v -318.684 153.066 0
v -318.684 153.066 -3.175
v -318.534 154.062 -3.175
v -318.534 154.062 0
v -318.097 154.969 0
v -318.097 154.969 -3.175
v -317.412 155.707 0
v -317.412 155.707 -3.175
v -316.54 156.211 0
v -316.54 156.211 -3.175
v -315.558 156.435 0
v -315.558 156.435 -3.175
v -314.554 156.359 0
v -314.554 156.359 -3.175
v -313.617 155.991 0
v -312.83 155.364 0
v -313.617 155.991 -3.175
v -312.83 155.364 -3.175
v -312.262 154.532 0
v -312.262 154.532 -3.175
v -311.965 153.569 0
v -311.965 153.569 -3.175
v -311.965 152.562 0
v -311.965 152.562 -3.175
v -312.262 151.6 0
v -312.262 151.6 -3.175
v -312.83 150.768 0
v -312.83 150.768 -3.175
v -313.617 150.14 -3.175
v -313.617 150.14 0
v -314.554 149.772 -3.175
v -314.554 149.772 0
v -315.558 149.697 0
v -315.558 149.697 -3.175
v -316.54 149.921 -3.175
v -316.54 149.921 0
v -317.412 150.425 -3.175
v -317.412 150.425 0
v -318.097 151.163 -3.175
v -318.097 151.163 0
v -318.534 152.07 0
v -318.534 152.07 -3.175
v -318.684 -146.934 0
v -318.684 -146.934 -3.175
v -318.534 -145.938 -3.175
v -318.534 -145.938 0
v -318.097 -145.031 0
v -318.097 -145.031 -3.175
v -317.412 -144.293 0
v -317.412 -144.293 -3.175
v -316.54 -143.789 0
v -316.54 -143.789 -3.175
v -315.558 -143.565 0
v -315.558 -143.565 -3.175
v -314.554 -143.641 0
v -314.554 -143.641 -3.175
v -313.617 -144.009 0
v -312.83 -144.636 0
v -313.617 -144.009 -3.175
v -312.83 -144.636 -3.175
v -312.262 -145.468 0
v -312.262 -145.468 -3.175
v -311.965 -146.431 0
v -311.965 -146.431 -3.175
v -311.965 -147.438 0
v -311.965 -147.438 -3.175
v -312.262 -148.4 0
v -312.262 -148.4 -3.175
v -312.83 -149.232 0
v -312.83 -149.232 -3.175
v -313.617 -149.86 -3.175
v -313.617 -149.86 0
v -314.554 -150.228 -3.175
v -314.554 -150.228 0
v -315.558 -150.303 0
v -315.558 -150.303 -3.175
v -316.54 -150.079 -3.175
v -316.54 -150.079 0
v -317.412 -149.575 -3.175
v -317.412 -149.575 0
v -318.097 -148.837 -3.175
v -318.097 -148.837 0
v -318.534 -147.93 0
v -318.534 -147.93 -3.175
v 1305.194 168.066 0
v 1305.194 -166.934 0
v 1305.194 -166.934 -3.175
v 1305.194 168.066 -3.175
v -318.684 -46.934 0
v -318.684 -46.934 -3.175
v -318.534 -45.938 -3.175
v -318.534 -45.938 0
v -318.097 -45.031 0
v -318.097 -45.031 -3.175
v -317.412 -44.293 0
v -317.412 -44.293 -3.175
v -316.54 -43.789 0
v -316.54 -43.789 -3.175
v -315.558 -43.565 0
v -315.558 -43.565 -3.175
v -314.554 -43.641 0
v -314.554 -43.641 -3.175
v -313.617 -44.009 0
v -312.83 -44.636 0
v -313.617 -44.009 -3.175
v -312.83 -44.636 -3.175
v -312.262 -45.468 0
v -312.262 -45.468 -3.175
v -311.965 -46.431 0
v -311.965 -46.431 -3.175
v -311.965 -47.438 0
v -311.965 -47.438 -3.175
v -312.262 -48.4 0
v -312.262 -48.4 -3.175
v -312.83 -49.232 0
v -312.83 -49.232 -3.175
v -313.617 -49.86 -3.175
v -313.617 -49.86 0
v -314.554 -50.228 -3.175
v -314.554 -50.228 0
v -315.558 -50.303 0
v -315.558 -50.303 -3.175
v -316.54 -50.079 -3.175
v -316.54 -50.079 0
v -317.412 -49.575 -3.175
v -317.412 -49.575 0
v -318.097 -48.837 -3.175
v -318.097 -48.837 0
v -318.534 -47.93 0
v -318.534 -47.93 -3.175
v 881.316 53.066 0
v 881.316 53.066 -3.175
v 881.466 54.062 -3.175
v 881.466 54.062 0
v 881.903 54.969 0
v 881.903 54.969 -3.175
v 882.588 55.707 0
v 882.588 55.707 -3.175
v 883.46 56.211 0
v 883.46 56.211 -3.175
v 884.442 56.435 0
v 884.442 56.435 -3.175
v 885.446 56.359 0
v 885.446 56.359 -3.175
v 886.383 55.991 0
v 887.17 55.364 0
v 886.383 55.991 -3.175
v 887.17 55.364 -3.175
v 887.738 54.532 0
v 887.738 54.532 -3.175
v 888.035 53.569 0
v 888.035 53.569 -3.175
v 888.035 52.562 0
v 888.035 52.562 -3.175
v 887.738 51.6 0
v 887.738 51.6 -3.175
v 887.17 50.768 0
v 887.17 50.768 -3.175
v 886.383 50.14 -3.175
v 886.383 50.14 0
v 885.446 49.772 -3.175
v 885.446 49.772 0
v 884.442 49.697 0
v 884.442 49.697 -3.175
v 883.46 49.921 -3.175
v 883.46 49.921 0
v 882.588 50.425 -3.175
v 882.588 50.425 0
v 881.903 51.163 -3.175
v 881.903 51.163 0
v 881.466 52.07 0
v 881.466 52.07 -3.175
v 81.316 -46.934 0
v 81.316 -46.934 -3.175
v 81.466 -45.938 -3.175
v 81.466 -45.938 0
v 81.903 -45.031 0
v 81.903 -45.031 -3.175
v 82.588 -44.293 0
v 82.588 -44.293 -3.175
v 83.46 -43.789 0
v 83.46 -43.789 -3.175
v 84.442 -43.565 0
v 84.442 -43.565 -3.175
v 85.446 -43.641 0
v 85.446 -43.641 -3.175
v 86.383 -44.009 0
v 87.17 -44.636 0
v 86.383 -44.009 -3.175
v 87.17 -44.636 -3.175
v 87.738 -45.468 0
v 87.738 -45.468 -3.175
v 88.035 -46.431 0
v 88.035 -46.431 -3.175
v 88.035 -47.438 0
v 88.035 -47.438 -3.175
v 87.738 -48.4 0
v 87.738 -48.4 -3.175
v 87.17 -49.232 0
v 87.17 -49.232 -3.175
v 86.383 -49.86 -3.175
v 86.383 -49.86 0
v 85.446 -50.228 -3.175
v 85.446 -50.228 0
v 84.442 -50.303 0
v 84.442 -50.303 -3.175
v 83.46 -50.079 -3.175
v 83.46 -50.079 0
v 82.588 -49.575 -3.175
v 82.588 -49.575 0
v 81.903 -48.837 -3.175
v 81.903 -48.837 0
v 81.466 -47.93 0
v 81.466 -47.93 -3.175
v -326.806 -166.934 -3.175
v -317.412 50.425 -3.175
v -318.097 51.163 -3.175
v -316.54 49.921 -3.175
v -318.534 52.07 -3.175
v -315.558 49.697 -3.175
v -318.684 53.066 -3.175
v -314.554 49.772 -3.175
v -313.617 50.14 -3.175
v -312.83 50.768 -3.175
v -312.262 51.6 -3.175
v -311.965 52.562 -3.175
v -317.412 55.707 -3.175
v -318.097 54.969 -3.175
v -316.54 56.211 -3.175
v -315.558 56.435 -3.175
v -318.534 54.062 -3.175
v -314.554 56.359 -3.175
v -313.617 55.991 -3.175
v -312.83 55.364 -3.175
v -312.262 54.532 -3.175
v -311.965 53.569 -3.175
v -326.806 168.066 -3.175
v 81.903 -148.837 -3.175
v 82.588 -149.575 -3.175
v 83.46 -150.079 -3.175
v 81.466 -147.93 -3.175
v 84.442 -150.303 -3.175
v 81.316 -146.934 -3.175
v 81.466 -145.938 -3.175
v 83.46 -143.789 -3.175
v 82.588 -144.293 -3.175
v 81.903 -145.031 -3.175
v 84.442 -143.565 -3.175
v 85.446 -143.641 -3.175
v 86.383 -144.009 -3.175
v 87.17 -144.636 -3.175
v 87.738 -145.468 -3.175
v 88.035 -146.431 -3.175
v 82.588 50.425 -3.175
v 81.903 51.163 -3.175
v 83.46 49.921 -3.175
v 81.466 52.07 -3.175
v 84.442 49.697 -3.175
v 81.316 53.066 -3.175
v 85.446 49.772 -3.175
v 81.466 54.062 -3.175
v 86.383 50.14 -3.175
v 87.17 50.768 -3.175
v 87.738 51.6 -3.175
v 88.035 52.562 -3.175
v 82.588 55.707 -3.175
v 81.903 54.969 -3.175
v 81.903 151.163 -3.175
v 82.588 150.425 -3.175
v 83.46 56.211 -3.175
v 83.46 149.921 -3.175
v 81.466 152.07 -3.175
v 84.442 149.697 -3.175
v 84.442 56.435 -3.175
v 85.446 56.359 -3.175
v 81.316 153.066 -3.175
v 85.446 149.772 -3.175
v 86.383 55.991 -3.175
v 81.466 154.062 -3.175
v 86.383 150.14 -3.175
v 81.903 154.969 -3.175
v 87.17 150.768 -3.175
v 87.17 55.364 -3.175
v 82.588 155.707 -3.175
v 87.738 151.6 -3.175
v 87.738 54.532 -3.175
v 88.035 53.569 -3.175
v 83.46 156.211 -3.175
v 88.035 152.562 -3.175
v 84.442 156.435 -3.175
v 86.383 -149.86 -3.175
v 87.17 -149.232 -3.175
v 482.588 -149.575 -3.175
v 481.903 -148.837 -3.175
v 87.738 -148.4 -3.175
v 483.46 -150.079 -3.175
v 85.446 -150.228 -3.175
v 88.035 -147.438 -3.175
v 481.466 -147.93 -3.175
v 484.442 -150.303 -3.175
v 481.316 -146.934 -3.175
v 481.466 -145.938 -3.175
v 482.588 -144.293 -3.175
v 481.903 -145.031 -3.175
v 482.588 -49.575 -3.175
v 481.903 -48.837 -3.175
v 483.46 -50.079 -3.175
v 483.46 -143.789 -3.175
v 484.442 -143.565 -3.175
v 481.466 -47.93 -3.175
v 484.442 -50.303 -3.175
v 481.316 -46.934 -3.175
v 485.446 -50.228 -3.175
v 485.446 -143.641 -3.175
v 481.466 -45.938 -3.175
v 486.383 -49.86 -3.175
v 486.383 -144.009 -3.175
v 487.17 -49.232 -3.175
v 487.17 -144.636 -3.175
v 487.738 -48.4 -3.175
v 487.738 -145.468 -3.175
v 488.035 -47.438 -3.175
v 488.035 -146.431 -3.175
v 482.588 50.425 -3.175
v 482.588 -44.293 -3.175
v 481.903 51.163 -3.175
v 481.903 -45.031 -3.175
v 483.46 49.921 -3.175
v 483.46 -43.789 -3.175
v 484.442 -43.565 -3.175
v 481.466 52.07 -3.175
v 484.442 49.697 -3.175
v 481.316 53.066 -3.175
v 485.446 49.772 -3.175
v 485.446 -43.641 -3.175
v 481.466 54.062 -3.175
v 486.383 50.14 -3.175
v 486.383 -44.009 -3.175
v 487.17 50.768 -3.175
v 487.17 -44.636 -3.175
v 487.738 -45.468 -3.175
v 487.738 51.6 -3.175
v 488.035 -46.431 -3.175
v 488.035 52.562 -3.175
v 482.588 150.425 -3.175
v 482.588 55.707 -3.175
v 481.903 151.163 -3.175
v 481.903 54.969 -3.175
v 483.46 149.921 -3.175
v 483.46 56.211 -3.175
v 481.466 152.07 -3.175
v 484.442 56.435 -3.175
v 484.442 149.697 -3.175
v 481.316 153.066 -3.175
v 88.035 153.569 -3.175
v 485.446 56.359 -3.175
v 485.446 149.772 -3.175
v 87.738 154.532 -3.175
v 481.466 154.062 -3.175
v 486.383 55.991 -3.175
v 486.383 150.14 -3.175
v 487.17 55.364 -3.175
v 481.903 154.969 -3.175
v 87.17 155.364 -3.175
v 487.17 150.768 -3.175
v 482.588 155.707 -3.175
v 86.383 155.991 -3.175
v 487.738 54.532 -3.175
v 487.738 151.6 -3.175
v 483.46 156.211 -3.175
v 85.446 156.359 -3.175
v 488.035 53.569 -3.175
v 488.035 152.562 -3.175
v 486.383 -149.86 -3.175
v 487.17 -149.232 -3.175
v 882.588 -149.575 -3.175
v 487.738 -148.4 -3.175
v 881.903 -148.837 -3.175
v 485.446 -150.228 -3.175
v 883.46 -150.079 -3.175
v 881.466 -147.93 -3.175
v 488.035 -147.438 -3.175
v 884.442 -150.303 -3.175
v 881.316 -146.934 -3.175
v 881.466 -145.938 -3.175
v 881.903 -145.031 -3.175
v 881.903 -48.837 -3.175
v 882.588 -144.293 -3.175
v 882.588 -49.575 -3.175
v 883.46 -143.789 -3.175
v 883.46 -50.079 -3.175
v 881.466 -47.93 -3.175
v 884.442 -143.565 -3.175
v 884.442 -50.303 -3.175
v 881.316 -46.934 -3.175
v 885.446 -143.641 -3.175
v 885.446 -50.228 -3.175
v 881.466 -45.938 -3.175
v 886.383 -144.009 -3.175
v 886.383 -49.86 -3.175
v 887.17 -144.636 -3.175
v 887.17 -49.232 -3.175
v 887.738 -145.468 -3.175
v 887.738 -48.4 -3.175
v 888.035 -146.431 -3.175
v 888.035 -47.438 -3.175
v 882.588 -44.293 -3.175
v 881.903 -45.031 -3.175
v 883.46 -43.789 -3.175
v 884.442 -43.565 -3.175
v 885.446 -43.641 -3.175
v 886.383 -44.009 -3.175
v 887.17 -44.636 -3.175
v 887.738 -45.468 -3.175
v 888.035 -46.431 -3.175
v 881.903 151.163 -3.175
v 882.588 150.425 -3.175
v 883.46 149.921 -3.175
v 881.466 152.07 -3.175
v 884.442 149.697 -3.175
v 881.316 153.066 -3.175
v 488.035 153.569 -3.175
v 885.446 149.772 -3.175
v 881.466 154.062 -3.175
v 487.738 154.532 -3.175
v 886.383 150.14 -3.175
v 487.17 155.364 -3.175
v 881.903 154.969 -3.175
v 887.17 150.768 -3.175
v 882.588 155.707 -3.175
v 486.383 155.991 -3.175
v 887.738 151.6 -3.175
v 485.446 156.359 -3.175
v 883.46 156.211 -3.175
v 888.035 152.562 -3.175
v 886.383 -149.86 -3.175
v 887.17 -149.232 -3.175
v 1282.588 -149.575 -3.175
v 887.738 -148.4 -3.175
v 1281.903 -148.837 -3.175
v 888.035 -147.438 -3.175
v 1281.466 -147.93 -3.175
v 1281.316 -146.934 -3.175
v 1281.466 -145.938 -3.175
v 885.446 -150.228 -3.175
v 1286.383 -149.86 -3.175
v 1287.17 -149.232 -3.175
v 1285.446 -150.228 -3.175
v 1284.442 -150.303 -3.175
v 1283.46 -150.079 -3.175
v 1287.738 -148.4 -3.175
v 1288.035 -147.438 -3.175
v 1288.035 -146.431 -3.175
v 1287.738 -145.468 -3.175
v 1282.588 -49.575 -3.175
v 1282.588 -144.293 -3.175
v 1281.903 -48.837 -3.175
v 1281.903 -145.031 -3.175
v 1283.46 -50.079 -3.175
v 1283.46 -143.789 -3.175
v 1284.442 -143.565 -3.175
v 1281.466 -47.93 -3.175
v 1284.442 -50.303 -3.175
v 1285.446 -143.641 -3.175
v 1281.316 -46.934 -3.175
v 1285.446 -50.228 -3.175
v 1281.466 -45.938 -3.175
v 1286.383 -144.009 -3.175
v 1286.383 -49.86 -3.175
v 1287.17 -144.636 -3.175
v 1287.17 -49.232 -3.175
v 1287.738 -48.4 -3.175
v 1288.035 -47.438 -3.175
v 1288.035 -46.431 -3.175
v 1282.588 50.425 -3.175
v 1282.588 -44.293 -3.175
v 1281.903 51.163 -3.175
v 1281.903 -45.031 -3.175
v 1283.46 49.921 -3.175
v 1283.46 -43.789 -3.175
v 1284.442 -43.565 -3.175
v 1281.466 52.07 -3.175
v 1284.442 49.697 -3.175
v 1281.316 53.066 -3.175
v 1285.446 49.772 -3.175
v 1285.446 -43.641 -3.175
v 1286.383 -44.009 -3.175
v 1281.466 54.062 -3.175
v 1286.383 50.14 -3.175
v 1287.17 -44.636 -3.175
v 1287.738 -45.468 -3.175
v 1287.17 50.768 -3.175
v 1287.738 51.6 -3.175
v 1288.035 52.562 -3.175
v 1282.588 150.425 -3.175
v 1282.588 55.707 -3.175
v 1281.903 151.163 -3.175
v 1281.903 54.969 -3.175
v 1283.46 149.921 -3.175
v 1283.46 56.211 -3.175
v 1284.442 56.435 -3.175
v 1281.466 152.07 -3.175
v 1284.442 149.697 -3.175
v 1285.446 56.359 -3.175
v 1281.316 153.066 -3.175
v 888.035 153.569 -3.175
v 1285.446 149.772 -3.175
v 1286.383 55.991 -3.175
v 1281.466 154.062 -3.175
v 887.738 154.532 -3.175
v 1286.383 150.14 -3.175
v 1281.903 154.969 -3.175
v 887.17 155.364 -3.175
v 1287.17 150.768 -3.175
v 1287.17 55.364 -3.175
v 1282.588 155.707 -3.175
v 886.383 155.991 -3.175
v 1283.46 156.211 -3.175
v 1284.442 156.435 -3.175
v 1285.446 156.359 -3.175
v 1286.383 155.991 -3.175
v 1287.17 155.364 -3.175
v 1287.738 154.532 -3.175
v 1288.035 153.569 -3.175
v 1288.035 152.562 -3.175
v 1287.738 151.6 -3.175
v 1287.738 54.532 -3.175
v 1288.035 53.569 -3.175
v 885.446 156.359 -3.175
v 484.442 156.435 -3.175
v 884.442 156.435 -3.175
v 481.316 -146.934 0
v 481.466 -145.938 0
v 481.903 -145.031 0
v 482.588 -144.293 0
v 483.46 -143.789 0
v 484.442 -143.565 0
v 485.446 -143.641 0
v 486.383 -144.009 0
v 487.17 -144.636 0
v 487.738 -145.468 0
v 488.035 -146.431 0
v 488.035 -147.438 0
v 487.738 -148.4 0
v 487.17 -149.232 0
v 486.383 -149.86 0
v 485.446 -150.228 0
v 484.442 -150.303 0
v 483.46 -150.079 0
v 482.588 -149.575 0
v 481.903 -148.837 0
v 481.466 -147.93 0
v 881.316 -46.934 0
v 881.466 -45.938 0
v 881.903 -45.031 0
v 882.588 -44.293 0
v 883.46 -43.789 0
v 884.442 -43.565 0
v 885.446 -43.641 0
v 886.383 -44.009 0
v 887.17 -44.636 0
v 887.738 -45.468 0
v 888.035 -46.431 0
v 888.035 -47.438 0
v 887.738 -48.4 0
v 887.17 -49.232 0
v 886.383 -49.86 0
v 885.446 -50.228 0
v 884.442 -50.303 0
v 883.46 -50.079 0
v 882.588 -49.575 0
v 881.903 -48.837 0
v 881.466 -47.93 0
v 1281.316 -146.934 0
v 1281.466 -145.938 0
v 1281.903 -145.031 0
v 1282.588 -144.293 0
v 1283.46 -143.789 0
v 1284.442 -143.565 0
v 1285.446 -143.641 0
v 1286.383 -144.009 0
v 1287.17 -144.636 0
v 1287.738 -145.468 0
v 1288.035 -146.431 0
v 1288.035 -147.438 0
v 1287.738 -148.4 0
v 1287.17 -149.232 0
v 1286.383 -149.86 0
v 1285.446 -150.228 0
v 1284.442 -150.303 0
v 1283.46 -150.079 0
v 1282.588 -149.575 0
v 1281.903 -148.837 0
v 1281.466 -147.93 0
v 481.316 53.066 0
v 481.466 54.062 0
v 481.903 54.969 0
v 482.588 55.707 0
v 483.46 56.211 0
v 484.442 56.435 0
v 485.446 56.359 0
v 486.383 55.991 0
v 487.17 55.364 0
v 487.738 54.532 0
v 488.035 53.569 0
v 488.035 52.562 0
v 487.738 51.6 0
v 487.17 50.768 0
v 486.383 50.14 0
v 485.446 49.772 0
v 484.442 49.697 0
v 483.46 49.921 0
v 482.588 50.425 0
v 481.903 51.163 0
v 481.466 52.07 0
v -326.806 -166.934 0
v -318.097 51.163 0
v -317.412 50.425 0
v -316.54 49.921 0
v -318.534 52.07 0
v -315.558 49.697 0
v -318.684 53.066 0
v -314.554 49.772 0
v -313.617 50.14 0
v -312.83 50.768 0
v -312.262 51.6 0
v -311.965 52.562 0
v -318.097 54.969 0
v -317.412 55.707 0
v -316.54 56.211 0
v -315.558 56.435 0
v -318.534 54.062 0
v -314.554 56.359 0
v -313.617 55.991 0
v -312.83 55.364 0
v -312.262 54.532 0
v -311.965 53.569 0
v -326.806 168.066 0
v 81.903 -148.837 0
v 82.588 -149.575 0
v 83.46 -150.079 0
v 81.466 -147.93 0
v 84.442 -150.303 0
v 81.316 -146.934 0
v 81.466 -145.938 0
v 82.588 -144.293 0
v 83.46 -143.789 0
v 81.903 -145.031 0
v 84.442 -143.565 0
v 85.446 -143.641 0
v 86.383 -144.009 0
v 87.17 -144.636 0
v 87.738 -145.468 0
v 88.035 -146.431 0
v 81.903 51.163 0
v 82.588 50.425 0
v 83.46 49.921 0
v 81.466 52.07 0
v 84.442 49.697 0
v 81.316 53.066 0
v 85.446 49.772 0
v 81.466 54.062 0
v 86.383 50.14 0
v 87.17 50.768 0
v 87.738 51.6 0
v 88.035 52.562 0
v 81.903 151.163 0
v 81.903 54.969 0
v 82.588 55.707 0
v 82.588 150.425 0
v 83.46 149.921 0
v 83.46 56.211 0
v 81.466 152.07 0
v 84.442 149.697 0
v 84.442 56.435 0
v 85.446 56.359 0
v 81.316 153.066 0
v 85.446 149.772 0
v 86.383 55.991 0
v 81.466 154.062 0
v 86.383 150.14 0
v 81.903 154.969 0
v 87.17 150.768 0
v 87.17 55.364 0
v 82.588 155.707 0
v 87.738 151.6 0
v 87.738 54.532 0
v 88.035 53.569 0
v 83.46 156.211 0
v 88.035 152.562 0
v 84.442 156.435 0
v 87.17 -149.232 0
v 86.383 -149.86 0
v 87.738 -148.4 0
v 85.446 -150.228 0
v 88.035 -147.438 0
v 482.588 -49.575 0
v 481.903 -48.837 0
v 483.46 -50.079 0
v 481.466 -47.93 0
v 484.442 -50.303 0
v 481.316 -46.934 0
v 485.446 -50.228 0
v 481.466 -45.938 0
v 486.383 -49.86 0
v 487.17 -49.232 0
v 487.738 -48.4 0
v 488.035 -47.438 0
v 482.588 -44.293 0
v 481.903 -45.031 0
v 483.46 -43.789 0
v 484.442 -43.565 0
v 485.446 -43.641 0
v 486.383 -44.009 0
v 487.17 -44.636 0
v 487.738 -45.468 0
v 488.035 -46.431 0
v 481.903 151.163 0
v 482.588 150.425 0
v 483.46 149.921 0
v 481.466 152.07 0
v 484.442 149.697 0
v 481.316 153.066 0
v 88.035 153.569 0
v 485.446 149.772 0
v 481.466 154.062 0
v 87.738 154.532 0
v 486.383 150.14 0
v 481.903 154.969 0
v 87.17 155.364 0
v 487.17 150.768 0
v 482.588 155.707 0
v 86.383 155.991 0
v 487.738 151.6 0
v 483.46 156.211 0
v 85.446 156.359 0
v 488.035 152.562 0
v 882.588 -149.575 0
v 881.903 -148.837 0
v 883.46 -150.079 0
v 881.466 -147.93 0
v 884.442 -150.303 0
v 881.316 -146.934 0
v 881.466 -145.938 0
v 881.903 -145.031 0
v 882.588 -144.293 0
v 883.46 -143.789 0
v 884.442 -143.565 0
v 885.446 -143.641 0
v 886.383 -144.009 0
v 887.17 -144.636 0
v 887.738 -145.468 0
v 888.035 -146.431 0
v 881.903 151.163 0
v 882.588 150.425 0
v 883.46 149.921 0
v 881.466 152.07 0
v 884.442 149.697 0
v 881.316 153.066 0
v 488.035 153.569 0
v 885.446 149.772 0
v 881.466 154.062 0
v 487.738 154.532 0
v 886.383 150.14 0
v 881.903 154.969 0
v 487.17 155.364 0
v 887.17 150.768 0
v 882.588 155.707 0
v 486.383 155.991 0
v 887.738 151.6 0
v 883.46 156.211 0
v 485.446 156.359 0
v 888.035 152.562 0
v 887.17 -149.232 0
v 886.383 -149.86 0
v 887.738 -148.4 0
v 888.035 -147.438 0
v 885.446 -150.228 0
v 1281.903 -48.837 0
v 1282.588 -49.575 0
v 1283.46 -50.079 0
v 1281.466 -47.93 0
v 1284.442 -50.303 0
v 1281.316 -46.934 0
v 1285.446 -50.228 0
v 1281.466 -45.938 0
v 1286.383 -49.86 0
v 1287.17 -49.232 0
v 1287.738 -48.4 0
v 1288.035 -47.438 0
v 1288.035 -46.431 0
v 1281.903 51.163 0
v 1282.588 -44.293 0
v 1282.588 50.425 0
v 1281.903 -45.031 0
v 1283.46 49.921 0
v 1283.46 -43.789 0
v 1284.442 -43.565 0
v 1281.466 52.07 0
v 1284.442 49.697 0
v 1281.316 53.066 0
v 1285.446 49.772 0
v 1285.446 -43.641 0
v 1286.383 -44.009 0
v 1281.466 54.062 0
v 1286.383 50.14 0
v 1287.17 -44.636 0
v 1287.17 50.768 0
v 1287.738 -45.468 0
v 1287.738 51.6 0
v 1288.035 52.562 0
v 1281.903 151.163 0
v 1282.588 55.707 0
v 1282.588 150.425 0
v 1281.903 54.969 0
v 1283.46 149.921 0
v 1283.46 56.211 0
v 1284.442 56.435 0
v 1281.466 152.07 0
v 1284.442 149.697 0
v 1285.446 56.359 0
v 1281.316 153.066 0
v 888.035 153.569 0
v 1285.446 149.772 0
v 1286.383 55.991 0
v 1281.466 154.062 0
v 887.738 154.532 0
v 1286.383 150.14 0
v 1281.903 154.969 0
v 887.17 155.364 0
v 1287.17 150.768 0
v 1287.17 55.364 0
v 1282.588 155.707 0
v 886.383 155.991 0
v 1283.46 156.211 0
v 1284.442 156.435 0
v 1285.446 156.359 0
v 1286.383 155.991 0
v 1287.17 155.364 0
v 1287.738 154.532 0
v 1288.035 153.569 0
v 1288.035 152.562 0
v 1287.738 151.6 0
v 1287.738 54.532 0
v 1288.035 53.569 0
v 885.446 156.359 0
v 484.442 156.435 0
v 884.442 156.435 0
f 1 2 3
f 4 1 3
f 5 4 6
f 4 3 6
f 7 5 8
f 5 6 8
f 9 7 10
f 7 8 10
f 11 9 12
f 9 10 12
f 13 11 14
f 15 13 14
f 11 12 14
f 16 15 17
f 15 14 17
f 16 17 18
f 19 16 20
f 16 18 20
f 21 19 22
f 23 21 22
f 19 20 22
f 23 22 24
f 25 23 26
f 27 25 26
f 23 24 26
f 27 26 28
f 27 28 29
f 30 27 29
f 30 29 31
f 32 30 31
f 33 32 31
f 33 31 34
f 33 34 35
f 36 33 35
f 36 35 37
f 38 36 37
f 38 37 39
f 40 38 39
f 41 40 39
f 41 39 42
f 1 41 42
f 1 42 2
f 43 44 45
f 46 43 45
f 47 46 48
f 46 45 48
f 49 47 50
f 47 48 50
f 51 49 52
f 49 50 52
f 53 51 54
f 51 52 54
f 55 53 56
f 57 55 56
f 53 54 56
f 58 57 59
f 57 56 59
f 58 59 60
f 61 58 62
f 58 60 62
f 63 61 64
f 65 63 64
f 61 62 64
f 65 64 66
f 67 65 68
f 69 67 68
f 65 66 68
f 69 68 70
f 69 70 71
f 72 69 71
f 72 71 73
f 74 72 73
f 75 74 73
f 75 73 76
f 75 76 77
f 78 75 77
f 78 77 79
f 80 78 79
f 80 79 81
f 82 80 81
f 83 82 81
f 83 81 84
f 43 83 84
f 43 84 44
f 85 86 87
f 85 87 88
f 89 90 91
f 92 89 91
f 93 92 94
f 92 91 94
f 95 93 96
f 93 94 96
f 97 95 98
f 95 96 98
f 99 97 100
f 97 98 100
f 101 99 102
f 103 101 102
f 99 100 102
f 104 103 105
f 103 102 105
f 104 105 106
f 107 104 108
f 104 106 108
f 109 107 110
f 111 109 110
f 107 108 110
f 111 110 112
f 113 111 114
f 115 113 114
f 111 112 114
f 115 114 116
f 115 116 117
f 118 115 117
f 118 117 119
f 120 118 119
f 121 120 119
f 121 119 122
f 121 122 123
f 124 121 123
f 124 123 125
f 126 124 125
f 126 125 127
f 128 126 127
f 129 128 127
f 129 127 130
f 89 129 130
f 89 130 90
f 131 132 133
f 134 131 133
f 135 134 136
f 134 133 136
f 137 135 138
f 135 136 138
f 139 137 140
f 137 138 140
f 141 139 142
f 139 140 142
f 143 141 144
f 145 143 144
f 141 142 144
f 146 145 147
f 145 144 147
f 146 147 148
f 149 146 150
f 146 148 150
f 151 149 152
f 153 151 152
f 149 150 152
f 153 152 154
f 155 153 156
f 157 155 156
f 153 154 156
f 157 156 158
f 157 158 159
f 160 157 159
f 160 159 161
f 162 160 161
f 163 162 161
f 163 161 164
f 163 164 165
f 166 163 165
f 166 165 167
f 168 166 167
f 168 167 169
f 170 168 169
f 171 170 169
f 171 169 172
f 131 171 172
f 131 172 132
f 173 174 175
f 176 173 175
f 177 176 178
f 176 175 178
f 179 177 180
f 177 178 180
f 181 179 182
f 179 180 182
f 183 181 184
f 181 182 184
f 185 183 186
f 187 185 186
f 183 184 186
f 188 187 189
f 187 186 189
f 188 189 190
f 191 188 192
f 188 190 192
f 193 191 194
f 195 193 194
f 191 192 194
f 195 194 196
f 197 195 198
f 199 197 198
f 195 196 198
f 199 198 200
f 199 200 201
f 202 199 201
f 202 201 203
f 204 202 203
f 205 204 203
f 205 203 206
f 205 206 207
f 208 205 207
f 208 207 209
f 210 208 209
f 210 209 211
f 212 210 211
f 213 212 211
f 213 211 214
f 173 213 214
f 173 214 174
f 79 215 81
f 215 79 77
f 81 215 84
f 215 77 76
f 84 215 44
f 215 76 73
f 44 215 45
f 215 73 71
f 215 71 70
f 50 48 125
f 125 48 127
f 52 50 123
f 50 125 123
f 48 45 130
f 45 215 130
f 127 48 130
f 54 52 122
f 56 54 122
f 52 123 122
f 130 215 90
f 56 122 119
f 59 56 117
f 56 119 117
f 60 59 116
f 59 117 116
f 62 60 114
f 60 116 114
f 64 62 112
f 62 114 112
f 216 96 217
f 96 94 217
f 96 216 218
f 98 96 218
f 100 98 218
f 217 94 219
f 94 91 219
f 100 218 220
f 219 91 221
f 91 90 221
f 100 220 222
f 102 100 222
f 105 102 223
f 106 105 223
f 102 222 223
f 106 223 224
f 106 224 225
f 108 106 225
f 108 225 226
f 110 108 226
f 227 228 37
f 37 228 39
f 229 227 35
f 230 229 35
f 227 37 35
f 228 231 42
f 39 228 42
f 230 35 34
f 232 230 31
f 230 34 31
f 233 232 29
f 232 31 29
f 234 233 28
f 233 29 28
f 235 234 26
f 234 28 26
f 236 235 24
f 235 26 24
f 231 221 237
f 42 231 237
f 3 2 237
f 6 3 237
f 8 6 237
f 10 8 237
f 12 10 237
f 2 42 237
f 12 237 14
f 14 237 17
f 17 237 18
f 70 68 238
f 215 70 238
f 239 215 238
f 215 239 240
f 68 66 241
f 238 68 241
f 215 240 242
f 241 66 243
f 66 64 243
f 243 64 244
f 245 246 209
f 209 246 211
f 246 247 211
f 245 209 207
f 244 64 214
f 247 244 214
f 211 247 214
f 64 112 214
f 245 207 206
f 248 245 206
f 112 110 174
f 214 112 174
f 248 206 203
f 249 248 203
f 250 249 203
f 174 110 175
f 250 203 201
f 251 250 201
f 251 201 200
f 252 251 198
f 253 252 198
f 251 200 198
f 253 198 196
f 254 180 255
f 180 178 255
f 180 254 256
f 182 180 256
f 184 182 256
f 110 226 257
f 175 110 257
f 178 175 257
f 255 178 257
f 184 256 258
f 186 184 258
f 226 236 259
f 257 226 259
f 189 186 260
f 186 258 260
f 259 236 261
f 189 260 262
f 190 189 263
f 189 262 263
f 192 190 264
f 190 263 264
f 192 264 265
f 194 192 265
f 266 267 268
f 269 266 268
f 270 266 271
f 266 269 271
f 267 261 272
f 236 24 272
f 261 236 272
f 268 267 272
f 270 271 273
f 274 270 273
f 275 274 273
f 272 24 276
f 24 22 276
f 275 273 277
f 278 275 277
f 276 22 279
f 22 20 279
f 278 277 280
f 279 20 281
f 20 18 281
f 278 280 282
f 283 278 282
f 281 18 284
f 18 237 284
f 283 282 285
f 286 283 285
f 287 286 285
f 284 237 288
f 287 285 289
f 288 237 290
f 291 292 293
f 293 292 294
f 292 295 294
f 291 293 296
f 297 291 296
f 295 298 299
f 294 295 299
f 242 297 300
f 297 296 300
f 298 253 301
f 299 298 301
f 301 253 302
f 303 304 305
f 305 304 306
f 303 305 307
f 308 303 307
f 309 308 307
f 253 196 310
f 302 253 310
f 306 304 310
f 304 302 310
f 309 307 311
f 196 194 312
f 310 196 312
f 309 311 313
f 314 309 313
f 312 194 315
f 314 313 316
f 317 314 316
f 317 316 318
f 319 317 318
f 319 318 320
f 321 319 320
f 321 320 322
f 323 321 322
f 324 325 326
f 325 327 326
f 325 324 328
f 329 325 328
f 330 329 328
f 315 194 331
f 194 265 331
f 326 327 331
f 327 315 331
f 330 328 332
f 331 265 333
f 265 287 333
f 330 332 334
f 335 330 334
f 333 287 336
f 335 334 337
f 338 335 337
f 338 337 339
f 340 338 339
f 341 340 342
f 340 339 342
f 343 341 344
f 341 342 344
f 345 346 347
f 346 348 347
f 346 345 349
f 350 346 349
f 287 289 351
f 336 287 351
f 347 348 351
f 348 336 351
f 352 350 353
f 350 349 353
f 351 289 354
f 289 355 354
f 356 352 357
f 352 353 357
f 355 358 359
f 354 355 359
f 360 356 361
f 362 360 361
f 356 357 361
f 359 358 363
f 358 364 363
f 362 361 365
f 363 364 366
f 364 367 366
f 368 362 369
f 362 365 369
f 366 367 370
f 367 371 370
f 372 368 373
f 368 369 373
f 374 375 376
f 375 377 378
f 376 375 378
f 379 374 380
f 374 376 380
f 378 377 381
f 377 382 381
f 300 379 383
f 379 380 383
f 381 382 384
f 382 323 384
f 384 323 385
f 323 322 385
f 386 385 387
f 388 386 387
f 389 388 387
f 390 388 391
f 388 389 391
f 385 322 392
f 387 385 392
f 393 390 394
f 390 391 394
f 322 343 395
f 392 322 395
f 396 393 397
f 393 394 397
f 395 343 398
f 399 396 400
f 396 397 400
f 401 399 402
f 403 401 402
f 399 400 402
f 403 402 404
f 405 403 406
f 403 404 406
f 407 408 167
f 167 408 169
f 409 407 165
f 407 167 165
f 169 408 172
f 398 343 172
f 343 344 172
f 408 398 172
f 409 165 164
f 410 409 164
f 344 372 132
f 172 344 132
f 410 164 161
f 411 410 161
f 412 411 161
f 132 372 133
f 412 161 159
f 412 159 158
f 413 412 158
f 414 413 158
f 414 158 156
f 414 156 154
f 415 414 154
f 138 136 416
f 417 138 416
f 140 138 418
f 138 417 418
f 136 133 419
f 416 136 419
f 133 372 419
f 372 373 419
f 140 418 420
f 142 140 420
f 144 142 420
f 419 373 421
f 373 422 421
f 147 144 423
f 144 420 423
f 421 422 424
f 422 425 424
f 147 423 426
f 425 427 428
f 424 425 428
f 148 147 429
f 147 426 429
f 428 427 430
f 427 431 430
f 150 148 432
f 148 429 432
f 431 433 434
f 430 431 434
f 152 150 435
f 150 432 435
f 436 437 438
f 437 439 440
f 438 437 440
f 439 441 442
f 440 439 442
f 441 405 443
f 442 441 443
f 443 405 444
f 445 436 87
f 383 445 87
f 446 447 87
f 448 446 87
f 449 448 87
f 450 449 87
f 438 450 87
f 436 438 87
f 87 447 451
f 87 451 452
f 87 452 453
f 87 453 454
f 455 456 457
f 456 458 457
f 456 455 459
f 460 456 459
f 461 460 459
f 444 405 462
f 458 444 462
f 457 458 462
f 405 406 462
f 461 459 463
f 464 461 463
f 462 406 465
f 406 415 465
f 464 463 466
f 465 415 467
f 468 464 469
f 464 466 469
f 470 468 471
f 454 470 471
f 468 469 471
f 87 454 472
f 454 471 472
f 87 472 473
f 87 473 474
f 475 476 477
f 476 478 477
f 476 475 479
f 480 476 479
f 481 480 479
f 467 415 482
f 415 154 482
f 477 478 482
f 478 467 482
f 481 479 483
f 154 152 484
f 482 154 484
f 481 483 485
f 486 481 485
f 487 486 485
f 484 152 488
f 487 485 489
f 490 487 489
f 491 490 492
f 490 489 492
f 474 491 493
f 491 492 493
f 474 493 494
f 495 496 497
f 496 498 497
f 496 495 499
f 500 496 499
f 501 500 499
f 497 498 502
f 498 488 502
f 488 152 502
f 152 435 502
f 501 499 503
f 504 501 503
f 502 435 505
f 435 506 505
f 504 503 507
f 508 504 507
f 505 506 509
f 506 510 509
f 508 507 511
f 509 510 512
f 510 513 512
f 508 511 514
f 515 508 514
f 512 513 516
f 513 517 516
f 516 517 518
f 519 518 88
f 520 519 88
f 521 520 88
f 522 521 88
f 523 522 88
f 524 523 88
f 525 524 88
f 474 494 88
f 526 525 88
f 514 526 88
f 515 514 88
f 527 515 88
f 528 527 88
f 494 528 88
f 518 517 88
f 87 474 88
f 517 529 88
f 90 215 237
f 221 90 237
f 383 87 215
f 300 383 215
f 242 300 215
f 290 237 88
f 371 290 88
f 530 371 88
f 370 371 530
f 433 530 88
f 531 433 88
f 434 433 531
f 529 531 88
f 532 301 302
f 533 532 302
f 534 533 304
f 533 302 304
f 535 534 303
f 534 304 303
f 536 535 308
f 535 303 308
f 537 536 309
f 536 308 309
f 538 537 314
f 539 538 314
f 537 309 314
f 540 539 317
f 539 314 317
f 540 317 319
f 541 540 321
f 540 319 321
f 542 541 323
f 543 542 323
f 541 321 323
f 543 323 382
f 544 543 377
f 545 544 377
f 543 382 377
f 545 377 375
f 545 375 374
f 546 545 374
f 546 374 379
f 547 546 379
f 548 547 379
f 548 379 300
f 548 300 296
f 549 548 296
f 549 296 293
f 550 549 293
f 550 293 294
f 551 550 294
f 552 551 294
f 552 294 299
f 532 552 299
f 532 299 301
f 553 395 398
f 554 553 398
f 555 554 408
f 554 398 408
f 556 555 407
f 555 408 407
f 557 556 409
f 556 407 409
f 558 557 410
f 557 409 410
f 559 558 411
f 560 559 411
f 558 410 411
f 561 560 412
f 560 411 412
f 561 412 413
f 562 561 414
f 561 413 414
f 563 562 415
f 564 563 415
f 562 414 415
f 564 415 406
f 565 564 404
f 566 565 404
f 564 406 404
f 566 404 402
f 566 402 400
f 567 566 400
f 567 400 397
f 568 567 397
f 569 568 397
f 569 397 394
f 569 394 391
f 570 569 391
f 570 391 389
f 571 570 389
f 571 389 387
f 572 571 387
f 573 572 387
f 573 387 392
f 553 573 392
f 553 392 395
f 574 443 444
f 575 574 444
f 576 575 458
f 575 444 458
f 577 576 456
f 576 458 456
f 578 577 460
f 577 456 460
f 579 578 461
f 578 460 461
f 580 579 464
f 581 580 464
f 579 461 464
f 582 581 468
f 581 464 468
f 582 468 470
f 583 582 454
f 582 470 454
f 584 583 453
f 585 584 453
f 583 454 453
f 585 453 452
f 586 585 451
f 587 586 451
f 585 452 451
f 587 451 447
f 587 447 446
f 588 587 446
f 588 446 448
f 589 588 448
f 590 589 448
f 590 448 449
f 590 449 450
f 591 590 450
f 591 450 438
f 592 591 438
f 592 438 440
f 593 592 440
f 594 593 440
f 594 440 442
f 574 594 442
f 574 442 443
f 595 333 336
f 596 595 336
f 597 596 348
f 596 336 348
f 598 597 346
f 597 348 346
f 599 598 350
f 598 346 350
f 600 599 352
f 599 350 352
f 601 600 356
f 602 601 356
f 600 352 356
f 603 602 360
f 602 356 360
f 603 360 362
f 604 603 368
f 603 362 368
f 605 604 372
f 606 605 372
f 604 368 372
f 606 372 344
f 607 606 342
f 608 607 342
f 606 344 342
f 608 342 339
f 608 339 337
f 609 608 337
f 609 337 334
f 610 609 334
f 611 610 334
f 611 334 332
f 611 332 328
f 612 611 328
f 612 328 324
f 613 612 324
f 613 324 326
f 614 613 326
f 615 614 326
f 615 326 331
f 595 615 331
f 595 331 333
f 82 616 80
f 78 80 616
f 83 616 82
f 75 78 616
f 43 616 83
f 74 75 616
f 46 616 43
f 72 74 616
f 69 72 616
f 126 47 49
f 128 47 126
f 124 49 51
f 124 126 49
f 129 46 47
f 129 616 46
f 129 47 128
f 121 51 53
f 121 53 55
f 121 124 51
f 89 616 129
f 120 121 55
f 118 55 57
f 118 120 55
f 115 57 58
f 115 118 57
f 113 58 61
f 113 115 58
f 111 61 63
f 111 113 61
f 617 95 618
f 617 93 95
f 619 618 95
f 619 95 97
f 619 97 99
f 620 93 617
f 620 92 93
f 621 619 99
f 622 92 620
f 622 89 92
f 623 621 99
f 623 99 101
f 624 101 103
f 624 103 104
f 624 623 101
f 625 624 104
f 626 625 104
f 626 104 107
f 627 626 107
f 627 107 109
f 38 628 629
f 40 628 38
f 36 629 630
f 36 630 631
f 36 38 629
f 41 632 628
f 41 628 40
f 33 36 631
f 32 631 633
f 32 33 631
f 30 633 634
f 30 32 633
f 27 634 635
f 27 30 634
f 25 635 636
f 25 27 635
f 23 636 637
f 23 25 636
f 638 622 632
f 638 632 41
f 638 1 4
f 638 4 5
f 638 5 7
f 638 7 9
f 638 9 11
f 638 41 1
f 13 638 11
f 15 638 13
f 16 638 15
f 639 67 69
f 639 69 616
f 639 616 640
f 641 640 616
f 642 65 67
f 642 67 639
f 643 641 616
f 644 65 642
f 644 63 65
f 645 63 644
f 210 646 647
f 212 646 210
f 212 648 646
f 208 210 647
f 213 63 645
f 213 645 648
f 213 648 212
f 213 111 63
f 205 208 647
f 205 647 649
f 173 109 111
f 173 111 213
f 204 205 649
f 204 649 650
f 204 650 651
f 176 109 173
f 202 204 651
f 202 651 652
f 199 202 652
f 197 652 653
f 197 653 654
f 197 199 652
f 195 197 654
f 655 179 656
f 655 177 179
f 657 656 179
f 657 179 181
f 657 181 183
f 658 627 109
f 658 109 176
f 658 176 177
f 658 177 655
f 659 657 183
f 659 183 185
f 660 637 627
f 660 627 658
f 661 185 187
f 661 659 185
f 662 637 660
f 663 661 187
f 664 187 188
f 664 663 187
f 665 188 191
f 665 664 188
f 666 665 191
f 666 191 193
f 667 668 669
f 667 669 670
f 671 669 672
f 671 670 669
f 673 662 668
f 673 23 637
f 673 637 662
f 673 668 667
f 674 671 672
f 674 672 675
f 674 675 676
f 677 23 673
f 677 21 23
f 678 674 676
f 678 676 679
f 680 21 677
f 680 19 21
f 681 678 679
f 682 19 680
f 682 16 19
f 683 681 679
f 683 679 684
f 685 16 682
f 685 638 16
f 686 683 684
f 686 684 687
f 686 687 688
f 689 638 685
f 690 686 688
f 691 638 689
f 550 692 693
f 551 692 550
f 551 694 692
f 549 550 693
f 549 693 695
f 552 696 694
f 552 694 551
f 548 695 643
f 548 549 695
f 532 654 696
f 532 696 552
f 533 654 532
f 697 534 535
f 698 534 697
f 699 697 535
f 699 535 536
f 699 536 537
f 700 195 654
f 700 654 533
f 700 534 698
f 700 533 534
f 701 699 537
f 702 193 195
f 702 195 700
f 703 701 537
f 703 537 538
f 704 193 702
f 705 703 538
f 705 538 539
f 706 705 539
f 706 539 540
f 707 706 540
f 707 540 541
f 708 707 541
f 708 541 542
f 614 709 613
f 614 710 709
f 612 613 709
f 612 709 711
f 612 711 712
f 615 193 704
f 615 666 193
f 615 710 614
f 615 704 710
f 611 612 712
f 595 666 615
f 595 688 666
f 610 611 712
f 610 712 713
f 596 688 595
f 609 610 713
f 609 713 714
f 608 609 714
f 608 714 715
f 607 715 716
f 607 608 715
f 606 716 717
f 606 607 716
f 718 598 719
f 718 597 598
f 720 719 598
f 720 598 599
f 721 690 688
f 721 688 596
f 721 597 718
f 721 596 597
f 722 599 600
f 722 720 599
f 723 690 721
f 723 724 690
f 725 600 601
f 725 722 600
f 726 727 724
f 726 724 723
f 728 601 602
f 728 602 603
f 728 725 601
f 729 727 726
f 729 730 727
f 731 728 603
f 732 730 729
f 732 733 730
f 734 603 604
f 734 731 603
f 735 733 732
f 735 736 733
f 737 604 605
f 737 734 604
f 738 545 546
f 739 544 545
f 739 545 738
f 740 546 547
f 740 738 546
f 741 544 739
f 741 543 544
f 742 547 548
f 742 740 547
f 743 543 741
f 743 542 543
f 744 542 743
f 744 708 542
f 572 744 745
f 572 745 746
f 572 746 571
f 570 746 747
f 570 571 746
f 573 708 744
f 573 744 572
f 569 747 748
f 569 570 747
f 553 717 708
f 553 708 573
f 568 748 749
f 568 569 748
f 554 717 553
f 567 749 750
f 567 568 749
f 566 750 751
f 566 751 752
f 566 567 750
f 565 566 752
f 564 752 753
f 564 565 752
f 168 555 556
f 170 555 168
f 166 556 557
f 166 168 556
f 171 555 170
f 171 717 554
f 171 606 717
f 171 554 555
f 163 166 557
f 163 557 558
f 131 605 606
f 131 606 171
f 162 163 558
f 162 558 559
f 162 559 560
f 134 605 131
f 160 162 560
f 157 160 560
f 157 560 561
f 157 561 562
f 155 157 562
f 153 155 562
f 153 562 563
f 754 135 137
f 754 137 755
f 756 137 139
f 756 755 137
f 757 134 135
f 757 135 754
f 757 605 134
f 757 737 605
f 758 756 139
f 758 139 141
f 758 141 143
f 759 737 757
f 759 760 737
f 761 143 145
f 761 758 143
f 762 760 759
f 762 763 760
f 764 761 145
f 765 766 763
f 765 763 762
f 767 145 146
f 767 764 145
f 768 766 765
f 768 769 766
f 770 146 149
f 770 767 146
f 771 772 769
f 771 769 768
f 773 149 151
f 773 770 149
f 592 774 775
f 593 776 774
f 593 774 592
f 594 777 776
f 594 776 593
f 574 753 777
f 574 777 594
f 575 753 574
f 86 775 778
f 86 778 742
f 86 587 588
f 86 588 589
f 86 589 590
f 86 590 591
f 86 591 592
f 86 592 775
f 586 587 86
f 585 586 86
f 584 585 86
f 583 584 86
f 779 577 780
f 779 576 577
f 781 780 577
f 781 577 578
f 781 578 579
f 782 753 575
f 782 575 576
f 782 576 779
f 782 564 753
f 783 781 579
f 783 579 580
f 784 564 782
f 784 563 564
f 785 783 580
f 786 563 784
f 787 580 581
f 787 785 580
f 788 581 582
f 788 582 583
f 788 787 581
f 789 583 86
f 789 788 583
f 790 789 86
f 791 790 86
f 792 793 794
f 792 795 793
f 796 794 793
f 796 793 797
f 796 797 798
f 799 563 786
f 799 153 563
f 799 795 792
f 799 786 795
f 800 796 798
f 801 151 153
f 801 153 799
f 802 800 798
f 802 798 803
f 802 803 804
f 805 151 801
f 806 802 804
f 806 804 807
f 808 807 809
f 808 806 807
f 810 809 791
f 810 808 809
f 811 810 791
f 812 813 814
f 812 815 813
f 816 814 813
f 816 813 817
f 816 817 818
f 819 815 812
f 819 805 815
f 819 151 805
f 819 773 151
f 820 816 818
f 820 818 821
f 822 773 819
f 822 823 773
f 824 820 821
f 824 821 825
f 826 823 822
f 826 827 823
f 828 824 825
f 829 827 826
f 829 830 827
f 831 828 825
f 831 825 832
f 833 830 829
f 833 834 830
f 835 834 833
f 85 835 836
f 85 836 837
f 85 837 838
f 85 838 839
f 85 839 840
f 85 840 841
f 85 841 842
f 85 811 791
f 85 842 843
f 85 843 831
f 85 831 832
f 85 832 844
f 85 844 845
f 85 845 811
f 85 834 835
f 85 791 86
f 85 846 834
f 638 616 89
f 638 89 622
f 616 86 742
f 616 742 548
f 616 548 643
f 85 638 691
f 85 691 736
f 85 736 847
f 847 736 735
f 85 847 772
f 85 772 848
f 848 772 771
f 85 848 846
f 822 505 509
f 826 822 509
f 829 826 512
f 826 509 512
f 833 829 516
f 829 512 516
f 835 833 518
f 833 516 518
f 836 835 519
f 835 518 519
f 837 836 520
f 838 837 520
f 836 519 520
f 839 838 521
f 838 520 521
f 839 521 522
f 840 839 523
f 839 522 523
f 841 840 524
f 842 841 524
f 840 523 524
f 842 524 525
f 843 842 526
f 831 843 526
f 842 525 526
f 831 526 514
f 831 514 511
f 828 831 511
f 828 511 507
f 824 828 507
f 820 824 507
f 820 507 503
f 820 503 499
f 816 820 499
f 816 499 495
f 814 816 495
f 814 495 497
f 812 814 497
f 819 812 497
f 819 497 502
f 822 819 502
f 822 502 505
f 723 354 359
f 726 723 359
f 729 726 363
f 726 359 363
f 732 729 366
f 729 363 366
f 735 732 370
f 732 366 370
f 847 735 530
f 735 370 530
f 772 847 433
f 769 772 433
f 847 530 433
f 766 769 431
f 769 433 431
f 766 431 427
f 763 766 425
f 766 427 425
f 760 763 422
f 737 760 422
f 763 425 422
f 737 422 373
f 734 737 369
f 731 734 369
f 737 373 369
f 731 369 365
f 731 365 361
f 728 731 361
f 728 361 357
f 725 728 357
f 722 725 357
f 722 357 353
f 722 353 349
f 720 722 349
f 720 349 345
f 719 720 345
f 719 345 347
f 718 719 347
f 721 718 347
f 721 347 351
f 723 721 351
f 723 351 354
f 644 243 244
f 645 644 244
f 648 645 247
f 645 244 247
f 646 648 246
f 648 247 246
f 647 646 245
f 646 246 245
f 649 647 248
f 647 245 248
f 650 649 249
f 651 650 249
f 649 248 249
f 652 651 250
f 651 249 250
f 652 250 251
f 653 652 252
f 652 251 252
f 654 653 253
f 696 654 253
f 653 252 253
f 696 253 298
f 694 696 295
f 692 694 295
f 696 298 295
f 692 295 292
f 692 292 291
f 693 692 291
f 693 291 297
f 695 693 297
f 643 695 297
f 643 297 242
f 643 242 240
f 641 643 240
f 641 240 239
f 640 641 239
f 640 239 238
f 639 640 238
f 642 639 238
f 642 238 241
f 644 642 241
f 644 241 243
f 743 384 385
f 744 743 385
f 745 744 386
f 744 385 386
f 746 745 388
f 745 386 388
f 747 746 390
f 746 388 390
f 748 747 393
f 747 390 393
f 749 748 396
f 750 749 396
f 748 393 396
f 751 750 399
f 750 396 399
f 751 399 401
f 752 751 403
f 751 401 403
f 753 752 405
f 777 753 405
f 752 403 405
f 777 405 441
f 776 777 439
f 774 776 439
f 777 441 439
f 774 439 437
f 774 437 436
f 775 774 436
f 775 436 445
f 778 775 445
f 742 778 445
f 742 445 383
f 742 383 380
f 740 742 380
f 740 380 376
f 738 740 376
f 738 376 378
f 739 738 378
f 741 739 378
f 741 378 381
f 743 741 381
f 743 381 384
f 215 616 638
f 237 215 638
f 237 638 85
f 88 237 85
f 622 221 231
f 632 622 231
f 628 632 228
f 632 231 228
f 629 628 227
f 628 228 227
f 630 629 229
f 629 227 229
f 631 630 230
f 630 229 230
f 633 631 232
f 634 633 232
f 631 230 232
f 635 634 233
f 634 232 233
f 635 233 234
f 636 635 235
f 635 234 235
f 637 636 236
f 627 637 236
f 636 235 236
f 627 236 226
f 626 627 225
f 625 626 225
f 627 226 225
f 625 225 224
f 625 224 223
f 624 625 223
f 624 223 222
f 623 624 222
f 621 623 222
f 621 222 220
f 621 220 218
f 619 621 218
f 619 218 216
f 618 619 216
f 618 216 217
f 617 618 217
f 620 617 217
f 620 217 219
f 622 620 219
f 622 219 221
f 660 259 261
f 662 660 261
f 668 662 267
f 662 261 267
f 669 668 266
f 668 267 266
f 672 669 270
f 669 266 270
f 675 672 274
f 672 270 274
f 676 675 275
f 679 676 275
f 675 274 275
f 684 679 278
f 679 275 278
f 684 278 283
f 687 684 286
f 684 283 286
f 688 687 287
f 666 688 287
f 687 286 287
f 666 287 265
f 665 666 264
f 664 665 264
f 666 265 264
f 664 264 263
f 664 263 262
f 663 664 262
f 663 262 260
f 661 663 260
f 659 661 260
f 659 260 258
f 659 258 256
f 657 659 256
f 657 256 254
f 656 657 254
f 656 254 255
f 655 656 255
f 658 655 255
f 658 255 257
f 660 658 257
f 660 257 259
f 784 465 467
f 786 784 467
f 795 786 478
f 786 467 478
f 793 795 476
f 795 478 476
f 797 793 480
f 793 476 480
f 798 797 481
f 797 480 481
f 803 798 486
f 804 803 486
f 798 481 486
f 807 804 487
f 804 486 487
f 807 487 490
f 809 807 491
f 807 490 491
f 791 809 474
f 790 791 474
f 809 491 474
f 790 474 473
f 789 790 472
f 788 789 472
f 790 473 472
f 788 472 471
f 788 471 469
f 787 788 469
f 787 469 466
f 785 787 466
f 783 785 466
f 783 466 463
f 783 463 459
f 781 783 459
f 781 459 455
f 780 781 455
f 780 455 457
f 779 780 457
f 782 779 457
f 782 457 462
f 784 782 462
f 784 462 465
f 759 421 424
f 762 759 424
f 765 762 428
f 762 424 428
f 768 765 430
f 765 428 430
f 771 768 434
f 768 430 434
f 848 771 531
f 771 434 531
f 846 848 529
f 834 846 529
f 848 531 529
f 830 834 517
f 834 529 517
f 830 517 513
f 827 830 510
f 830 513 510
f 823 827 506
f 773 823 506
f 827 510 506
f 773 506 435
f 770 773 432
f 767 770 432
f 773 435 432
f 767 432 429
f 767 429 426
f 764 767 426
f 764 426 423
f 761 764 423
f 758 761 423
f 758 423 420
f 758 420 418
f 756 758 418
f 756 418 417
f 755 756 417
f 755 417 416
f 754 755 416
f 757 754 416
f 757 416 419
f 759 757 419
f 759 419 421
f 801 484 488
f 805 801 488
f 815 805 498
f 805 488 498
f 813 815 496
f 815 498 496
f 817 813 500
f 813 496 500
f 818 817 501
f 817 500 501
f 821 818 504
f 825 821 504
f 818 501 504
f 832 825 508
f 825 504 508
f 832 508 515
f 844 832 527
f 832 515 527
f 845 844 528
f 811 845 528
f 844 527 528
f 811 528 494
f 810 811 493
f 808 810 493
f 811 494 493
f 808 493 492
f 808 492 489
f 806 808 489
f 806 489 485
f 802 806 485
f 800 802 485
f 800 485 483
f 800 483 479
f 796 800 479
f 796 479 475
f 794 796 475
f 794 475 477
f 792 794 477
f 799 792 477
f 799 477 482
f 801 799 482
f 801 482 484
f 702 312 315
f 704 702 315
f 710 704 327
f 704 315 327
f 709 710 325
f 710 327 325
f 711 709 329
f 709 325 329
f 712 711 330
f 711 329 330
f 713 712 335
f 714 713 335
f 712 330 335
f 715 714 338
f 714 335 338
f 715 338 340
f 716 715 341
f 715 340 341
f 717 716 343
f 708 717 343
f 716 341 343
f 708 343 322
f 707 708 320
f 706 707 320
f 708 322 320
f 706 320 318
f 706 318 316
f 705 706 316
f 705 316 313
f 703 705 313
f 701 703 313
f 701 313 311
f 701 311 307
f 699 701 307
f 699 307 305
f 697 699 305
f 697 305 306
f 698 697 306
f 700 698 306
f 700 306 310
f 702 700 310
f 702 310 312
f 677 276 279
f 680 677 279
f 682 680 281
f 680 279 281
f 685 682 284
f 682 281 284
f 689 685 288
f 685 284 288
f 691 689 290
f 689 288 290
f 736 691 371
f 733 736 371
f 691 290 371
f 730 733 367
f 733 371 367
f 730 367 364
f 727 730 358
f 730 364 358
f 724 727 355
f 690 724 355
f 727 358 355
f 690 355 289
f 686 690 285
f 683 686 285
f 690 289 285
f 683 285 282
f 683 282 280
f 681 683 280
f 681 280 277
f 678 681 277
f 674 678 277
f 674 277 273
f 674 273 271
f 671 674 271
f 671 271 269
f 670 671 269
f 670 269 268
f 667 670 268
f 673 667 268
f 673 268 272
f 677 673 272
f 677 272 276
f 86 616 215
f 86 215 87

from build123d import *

# Parameters (mm, degrees)
CROQUIS1_W                    = 1632
CROQUIS1_H                    = 335
BRIDA_BASE1_DEPTH             = 3.175
TALADRO_DE_MARGEN_PARA_1_41_D = 6.7564


# Sheet-metal steps are written as plain solids
with BuildPart() as part:
    # Croquis1 → Brida base1 (new body)
    with BuildSketch(Plane.XY):
        with Locations((489.194067834, 0.565878378)):
            Rectangle(CROQUIS1_W, CROQUIS1_H)
    extrude(amount=-BRIDA_BASE1_DEPTH)

    # Taladro de margen para 1/41 (through all)
    with Locations(Plane.XY):
        with Locations((1284.694067834, 153.065878378), (884.694067834, 153.065878378), (484.694067834, 153.065878378), (84.694067834, 153.065878378), (-315.305932166, 153.065878378), (884.694067834, 53.065878378), (484.694067834, 53.065878378), (84.694067834, 53.065878378), (-315.305932166, 53.065878378), (884.694067834, -46.934121622), (484.694067834, -46.934121622), (84.694067834, -46.934121622), (-315.305932166, -46.934121622), (884.694067834, -146.934121622), (484.694067834, -146.934121622), (84.694067834, -146.934121622), (-315.305932166, -146.934121622), (1284.694067834, 53.065878378), (1284.694067834, -46.934121622), (1284.694067834, -146.934121622)):
            Hole(TALADRO_DE_MARGEN_PARA_1_41_D / 2)


solid = part.part
